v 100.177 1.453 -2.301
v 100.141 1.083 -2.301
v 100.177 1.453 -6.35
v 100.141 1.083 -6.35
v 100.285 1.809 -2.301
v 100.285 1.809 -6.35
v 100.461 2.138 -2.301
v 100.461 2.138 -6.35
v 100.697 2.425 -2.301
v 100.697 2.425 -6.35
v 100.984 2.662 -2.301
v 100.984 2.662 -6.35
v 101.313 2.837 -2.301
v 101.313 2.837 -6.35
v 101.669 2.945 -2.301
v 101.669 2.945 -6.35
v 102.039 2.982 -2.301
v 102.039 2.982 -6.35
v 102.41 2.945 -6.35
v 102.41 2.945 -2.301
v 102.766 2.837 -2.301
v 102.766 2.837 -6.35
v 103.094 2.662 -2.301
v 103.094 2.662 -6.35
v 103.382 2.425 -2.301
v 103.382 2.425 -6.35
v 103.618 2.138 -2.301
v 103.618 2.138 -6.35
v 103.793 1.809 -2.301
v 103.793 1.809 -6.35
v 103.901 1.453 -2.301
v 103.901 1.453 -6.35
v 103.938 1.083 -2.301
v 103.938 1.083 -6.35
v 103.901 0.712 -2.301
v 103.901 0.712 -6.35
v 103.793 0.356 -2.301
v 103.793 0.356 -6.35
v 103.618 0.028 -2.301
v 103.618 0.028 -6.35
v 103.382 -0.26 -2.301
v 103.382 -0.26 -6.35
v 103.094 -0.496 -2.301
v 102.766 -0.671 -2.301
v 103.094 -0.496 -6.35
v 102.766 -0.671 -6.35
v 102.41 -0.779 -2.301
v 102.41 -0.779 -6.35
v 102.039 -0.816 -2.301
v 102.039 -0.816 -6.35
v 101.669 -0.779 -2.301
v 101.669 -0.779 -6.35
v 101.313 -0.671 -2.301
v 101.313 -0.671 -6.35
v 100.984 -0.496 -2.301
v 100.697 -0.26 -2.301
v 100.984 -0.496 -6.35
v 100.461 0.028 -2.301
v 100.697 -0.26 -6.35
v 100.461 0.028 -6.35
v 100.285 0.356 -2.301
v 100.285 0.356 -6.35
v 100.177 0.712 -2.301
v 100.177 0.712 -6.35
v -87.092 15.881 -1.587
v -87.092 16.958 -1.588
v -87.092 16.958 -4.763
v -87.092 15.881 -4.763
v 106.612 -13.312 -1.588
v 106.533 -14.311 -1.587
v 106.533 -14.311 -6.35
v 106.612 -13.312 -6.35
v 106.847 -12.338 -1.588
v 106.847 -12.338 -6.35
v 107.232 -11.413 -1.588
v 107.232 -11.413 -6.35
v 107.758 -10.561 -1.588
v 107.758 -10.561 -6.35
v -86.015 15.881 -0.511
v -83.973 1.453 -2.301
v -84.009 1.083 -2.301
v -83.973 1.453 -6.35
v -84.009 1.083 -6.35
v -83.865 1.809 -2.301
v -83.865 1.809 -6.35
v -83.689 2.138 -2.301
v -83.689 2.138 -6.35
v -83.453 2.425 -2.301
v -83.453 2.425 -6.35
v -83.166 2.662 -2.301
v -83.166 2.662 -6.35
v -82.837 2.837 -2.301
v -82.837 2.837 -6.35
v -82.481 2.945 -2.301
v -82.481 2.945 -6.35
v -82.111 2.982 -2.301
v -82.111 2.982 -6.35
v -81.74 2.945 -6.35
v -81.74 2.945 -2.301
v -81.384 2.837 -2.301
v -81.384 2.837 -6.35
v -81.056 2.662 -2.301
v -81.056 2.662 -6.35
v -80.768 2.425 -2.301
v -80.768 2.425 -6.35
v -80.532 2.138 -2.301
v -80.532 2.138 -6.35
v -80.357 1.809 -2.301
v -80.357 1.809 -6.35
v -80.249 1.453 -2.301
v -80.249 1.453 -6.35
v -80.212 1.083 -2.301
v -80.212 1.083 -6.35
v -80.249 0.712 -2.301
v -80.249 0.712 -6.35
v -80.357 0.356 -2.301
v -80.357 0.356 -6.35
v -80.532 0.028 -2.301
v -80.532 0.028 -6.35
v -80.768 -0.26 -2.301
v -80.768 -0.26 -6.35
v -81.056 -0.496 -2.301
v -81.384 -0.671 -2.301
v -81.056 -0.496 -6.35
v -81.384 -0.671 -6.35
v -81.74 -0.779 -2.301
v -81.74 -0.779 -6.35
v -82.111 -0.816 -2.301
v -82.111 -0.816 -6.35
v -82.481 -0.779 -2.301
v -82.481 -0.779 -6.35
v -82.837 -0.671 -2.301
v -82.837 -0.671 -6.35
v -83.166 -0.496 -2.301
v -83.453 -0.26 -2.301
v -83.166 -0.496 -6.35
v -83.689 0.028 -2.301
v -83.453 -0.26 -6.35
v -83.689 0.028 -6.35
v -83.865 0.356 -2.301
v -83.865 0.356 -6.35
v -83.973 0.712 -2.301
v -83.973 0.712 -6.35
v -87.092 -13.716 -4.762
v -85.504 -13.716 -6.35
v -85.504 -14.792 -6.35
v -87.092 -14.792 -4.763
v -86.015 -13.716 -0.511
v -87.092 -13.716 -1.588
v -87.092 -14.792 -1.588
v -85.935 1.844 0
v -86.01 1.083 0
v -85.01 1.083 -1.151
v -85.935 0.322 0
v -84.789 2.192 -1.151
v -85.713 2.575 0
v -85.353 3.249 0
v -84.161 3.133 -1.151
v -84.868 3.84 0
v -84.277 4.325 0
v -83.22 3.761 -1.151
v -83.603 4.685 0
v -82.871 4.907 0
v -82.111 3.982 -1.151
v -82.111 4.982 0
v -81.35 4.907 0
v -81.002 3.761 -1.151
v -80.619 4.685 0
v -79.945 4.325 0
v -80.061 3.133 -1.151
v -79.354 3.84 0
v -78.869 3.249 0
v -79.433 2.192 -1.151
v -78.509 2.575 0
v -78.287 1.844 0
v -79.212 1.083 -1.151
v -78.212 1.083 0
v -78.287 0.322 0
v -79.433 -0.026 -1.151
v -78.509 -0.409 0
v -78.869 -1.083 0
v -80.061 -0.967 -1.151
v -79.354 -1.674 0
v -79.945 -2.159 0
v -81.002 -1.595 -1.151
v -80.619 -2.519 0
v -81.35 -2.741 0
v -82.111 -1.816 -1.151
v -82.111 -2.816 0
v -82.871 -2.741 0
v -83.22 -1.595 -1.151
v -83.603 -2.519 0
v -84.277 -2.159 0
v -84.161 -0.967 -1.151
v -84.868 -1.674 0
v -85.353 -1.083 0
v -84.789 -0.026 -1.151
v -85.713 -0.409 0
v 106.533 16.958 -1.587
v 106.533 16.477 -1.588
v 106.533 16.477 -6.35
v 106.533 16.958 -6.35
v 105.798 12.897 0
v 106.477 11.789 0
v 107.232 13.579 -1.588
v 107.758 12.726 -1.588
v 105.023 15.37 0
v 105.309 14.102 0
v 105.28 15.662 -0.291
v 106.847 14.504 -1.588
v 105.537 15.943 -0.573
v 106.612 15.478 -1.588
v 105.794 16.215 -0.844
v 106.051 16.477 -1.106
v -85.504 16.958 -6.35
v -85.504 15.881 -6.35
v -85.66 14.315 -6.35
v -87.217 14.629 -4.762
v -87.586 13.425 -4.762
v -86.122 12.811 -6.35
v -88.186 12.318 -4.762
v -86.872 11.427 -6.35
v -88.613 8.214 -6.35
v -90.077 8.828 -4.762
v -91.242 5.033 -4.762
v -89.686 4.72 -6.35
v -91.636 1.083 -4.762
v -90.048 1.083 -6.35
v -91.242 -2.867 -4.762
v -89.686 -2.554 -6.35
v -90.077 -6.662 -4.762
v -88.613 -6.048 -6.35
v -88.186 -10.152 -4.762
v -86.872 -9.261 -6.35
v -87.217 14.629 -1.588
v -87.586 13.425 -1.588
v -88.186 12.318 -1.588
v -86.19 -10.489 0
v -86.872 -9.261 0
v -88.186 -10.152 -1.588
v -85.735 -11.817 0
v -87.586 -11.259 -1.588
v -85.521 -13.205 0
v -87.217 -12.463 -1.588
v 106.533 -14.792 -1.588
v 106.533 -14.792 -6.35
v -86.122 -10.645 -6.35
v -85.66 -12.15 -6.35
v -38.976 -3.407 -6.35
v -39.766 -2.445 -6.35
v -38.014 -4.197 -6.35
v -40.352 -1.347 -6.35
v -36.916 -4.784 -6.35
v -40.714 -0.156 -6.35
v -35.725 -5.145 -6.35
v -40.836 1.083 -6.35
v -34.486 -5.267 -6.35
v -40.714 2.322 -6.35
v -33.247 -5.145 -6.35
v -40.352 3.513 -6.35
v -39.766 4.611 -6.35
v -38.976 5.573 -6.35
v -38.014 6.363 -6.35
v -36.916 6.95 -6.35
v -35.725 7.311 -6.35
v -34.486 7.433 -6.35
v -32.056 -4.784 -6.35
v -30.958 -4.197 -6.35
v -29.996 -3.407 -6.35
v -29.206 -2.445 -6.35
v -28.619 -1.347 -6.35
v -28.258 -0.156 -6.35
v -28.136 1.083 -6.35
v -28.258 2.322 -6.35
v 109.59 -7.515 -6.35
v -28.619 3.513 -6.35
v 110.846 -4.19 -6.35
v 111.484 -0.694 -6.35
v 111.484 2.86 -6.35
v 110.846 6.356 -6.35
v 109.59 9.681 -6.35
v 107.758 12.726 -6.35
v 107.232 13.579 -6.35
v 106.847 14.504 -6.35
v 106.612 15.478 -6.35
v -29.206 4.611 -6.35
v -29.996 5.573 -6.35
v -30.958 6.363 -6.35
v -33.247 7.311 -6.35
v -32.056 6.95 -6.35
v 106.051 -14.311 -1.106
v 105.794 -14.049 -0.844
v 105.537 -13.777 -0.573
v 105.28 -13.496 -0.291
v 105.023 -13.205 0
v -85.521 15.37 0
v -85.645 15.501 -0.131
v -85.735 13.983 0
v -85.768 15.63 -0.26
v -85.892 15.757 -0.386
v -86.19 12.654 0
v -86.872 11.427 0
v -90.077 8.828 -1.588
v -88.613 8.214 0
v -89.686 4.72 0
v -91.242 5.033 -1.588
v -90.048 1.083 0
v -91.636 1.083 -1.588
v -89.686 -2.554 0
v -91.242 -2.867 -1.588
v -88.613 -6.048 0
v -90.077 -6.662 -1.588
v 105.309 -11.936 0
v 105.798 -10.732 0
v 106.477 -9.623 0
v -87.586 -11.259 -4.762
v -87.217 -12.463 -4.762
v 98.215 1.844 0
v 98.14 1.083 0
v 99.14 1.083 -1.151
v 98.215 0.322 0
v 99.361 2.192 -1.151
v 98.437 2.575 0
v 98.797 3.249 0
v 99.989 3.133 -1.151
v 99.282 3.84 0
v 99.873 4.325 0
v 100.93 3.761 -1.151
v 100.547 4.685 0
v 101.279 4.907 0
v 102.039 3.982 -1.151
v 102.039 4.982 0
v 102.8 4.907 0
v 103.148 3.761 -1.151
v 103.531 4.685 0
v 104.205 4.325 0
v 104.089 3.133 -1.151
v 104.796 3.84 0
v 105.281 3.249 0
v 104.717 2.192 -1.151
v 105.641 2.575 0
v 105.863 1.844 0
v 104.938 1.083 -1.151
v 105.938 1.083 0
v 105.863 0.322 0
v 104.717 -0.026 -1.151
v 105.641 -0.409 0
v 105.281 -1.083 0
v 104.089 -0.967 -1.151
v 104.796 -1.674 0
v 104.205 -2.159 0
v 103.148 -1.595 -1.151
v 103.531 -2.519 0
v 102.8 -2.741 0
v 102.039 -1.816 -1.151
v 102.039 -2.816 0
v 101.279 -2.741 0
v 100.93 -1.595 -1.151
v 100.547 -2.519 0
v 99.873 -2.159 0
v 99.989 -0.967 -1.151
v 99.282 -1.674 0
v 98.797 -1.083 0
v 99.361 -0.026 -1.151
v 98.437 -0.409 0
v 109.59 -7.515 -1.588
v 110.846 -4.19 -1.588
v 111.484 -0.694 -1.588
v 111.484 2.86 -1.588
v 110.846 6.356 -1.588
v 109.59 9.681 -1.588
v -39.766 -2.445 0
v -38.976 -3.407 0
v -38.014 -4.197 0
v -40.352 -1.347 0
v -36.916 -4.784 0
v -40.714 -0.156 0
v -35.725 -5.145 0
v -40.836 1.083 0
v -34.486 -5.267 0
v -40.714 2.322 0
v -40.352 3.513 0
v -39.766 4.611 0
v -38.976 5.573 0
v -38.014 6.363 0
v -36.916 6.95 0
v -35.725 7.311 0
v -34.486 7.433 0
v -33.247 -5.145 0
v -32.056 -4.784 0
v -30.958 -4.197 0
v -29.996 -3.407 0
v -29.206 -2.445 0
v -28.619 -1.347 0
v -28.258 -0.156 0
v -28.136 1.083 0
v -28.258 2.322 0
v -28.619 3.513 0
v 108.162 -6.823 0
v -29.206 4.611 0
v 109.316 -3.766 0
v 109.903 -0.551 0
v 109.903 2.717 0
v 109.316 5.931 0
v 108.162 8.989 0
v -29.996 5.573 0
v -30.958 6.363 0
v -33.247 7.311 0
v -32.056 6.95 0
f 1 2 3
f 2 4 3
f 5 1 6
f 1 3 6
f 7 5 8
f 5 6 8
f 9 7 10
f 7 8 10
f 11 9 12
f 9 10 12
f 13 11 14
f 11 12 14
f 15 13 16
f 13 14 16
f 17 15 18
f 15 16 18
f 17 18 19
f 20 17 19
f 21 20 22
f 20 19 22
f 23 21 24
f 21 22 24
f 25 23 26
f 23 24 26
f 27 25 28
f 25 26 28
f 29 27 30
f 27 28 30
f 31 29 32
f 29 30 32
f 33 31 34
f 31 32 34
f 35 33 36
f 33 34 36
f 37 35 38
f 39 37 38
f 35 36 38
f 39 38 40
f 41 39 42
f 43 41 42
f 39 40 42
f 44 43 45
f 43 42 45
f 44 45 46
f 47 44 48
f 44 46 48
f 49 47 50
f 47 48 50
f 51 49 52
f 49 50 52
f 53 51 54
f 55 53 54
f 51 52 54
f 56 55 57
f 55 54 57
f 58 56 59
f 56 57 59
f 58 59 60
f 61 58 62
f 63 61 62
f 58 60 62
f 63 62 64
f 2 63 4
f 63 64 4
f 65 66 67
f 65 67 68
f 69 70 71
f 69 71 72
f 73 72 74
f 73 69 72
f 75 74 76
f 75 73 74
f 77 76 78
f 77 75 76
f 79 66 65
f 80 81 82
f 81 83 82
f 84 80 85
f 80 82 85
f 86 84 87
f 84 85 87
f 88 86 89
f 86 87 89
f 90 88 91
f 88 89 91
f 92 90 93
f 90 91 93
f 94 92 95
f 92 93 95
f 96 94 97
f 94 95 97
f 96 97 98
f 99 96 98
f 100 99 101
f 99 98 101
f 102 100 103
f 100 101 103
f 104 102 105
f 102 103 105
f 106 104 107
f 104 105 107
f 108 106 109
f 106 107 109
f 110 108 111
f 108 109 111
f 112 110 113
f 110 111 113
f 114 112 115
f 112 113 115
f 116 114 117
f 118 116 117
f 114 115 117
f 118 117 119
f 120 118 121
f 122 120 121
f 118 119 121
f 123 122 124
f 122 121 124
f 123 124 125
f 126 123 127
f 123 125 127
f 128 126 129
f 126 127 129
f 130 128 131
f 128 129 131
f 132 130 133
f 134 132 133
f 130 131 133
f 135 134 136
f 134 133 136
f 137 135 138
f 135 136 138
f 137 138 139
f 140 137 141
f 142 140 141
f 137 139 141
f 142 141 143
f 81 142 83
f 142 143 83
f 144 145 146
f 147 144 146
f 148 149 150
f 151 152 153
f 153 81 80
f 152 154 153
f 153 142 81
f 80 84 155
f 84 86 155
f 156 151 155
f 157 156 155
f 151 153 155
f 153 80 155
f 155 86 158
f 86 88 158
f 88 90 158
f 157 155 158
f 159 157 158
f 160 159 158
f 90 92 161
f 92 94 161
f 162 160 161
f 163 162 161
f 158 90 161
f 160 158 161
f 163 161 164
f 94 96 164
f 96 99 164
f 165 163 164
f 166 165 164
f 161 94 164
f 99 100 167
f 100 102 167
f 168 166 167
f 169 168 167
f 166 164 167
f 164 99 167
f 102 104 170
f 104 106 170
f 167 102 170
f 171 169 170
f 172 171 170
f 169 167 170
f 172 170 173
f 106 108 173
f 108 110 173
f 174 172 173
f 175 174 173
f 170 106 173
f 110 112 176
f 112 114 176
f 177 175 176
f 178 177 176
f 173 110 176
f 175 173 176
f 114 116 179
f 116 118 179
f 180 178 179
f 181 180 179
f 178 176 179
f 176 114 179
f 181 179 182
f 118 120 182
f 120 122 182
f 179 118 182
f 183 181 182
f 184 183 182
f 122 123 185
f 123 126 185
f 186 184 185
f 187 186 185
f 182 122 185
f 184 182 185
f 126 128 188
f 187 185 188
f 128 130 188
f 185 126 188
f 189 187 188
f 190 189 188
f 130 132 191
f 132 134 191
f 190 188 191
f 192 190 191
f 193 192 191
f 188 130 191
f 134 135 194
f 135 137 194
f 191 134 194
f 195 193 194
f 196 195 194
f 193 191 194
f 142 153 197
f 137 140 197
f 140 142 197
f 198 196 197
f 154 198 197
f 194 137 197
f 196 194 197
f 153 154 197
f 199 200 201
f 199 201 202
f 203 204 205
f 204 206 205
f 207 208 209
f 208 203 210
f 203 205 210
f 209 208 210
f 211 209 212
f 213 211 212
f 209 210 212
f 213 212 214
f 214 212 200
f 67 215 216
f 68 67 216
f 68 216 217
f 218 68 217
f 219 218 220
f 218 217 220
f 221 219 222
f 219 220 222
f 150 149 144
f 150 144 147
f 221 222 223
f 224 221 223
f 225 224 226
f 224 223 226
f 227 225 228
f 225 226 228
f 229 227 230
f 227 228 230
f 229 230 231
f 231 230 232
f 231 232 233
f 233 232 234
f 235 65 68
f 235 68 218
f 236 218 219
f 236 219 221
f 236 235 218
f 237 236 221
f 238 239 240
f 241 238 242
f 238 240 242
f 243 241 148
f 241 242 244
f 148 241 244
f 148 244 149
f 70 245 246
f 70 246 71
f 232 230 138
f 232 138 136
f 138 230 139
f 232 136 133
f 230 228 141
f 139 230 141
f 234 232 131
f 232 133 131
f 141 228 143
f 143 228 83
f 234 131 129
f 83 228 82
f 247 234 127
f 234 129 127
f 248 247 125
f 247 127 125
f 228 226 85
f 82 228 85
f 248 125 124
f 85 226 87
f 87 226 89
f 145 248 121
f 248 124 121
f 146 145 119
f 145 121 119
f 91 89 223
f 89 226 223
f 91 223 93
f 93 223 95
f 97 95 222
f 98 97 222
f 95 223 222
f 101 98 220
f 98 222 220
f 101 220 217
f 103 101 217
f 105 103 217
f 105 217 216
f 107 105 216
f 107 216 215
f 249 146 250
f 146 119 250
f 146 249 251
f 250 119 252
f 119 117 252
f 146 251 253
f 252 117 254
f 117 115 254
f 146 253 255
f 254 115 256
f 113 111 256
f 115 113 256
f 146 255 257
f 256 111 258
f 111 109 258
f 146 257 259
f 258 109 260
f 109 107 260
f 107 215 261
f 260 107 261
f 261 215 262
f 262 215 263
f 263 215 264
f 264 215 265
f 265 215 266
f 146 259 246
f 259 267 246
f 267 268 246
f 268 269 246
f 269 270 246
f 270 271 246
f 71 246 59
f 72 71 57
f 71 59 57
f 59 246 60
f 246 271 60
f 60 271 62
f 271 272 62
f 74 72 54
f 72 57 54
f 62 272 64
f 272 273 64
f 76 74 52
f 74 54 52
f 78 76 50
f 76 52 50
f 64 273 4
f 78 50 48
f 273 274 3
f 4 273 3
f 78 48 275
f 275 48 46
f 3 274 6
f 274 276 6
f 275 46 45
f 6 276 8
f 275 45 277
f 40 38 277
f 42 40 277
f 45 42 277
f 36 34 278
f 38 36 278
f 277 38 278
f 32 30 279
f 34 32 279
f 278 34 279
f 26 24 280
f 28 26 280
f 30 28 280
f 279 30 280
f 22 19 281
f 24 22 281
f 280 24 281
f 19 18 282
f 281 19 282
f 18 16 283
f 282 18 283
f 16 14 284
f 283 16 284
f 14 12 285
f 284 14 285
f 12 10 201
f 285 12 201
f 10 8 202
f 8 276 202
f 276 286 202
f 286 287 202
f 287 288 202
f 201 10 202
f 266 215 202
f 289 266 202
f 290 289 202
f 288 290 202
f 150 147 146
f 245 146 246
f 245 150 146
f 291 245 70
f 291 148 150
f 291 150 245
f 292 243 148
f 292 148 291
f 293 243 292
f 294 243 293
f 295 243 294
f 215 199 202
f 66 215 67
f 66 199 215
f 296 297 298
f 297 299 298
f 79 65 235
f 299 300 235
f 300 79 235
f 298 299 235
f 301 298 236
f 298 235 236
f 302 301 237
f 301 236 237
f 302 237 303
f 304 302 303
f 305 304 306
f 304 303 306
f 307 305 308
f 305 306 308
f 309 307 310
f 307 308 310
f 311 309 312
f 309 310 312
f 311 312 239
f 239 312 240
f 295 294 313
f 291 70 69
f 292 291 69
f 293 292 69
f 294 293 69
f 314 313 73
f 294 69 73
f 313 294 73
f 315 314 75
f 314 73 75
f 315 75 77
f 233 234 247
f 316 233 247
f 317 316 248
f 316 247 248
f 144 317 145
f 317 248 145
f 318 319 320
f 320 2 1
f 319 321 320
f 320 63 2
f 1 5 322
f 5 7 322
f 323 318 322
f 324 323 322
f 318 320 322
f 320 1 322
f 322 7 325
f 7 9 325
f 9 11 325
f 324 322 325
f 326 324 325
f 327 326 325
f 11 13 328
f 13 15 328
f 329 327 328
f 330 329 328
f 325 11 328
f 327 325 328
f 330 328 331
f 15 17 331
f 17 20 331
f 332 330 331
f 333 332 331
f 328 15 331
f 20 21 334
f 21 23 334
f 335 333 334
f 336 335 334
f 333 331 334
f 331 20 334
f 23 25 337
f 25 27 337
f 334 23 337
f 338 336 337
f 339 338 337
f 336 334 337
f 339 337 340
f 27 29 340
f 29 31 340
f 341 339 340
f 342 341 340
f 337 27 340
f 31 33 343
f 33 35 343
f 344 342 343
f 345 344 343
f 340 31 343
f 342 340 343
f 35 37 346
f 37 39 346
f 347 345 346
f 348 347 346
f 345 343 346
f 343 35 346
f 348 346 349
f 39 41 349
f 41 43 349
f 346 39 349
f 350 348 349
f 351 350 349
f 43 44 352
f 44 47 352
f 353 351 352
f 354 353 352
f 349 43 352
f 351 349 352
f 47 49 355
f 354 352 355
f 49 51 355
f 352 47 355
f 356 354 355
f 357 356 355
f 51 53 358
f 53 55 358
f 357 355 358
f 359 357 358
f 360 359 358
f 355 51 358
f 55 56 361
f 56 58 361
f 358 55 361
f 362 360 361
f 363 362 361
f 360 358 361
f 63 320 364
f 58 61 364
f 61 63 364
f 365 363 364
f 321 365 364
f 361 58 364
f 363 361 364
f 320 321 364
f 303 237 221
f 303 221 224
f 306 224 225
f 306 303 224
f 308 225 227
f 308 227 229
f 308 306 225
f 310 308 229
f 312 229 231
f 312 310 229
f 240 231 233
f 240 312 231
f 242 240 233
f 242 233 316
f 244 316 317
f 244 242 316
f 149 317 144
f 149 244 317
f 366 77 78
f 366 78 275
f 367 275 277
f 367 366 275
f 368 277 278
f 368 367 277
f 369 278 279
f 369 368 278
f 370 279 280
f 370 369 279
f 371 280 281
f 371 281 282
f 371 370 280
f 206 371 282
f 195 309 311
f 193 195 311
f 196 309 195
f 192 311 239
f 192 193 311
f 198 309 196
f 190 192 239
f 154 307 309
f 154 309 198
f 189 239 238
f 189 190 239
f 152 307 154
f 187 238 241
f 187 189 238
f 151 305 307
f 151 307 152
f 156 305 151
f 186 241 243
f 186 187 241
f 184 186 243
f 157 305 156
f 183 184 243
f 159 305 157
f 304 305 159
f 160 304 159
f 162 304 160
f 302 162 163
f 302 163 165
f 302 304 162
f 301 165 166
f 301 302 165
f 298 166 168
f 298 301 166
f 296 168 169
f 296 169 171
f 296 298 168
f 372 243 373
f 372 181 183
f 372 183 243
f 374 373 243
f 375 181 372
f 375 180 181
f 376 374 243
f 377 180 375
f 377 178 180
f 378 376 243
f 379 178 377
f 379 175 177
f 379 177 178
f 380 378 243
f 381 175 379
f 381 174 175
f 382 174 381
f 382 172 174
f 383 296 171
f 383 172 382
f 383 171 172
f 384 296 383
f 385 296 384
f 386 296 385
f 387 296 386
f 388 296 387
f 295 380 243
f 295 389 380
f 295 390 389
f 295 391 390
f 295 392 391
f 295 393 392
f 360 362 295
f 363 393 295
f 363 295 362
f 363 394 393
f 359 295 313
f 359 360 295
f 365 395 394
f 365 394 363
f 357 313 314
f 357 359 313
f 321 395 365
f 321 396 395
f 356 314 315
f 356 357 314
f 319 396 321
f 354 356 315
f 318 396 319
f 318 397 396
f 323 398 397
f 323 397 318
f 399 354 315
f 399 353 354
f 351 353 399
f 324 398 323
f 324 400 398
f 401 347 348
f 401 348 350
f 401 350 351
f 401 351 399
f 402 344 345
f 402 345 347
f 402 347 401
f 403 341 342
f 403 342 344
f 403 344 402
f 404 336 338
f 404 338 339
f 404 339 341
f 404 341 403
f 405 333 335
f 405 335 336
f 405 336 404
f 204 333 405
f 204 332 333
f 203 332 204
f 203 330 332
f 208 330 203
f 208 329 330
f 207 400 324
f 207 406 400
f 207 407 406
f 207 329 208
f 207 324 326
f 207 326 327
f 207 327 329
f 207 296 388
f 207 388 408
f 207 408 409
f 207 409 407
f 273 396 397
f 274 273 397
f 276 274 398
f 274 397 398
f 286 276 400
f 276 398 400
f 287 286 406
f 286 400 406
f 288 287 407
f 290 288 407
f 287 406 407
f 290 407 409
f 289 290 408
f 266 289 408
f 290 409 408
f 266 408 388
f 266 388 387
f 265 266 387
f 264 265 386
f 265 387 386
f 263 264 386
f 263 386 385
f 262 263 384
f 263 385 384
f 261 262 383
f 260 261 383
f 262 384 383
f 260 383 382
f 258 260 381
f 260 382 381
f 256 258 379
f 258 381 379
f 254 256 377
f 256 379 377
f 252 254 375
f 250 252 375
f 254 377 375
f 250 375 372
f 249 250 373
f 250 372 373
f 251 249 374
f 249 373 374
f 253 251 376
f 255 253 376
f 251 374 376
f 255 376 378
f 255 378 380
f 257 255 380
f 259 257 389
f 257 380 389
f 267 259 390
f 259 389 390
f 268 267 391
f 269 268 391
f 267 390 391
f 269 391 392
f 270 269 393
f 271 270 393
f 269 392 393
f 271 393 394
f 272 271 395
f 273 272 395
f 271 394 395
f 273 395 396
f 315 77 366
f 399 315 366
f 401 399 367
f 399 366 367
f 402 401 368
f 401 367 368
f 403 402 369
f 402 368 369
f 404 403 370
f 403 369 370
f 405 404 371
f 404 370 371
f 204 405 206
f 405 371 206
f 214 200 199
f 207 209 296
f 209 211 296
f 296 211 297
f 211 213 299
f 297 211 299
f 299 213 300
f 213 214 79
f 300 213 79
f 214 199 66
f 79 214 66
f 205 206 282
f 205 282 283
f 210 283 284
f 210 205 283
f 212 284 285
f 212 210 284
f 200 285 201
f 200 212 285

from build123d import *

# Parameters (mm, degrees)
F0_R           = 6.35
F1_DEPTH       = 6.35
F2_D           = 3.7973
F2_CSINK_D     = 7.7978
F2_CSINK_ANGLE = 82
F3_C1_SIZE     = 1.5875
F3_C2_SIZE     = 1.5875
F3_C3_SIZE     = 1.5875
F3_C4_SIZE     = 1.5875
F3_C5_SIZE     = 1.5875


with BuildPart() as f1:
    # F0 (on Top) → F1 (new body)
    with BuildSketch(Plane.XY):
        with BuildLine():
            Line((-87.0919269209, -13.7156903623), (-87.0919269209, -14.792130794))
            Line((-87.0919269209, -14.792130794), (106.5325381816, -14.792130794))
            Line((106.5325381816, -14.792130794), (106.5325381816, -14.3110791923))
            ThreePointArc((106.5325381816, -14.3110791923), (106.846778333, -12.3382378278), (107.7583974098, -10.5606550362))
            ThreePointArc((107.7583974098, -10.5606550362), (111.5641860478, 1.082869206), (107.7583974098, 12.7263934482))
            ThreePointArc((107.7583974098, 12.7263934482), (106.846778333, 14.5039762398), (106.5325381816, 16.4768176043))
            Line((106.5325381816, 16.4768176043), (106.5325381816, 16.957869206))
            Line((106.5325381816, 16.957869206), (-87.0919269209, 16.957869206))
            Line((-87.0919269209, 16.957869206), (-87.0919269209, 15.8814287743))
            ThreePointArc((-87.0919269209, 15.8814287743), (-87.3716340972, 14.0175497454), (-88.1861143334, 12.3178723984))
            ThreePointArc((-88.1861143334, 12.3178723984), (-91.6358139522, 1.082869206), (-88.1861143334, -10.1521339864))
            ThreePointArc((-88.1861143334, -10.1521339864), (-87.3716340972, -11.8518113334), (-87.0919269209, -13.7156903623))
        make_face()
        with Locations((-34.4858139522, 1.082869206)):
            Circle(F0_R, mode=Mode.SUBTRACT)
    extrude(amount=-F1_DEPTH)

    # F2 (through all)
    with Locations(Plane.XY):
        with Locations((102.0391860478, 1.082869206), (-82.1108139522, 1.082869206)):
            CounterSinkHole(F2_D / 2, F2_CSINK_D / 2, counter_sink_angle=F2_CSINK_ANGLE)

    # F3: chamfer of 1.5875 on 9 edges, made by hand

    # F3_c1
    f3_c1_edges = [f1.edges().sort_by_distance(p)[0] for p in [
        (-87.3716340972, -11.8518113334, 0),
        (-91.6358139522, 1.082869206, 0),
        (-87.0919269209, -14.2539105781, 0),
        (-87.3716340972, 14.0175497454, 0),
        (-87.0919269209, 16.4196489902, 0),
    ]]
    chamfer(f3_c1_edges, length=F3_C1_SIZE)

    # F3_c2
    f3_c2_edges = [f1.edges().sort_by_distance(p)[0] for p in [
        (-87.3716340972, -11.8518113334, -6.35),
        (-91.6358139522, 1.082869206, -6.35),
        (-87.0919269209, -14.2539105781, -6.35),
        (-87.3716340972, 14.0175497454, -6.35),
        (-87.0919269209, 16.4196489902, -6.35),
    ]]
    chamfer(f3_c2_edges, length=F3_C2_SIZE)

    # F3_c3
    f3_c3_edges = [f1.edges().sort_by_distance(p)[0] for p in [
        (106.5325381816, -14.5516049932, 0),
        (106.846778333, -12.3382378278, 0),
        (106.5325381816, 16.7173434052, 0),
        (111.5641860478, 1.082869206, 0),
        (106.846778333, 14.5039762398, 0),
    ]]
    chamfer(f3_c3_edges, length=F3_C3_SIZE)

    # F3_c4
    f3_c4_edges = [f1.edges().sort_by_distance(p)[0] for p in [
        (9.7203056303, -14.792130794, 0),
    ]]
    chamfer(f3_c4_edges, length=F3_C4_SIZE)

    # F3_c5
    f3_c5_edges = [f1.edges().sort_by_distance(p)[0] for p in [
        (9.7203056303, 16.957869206, 0),
    ]]
    chamfer(f3_c5_edges, length=F3_C5_SIZE)


solid = f1.part
